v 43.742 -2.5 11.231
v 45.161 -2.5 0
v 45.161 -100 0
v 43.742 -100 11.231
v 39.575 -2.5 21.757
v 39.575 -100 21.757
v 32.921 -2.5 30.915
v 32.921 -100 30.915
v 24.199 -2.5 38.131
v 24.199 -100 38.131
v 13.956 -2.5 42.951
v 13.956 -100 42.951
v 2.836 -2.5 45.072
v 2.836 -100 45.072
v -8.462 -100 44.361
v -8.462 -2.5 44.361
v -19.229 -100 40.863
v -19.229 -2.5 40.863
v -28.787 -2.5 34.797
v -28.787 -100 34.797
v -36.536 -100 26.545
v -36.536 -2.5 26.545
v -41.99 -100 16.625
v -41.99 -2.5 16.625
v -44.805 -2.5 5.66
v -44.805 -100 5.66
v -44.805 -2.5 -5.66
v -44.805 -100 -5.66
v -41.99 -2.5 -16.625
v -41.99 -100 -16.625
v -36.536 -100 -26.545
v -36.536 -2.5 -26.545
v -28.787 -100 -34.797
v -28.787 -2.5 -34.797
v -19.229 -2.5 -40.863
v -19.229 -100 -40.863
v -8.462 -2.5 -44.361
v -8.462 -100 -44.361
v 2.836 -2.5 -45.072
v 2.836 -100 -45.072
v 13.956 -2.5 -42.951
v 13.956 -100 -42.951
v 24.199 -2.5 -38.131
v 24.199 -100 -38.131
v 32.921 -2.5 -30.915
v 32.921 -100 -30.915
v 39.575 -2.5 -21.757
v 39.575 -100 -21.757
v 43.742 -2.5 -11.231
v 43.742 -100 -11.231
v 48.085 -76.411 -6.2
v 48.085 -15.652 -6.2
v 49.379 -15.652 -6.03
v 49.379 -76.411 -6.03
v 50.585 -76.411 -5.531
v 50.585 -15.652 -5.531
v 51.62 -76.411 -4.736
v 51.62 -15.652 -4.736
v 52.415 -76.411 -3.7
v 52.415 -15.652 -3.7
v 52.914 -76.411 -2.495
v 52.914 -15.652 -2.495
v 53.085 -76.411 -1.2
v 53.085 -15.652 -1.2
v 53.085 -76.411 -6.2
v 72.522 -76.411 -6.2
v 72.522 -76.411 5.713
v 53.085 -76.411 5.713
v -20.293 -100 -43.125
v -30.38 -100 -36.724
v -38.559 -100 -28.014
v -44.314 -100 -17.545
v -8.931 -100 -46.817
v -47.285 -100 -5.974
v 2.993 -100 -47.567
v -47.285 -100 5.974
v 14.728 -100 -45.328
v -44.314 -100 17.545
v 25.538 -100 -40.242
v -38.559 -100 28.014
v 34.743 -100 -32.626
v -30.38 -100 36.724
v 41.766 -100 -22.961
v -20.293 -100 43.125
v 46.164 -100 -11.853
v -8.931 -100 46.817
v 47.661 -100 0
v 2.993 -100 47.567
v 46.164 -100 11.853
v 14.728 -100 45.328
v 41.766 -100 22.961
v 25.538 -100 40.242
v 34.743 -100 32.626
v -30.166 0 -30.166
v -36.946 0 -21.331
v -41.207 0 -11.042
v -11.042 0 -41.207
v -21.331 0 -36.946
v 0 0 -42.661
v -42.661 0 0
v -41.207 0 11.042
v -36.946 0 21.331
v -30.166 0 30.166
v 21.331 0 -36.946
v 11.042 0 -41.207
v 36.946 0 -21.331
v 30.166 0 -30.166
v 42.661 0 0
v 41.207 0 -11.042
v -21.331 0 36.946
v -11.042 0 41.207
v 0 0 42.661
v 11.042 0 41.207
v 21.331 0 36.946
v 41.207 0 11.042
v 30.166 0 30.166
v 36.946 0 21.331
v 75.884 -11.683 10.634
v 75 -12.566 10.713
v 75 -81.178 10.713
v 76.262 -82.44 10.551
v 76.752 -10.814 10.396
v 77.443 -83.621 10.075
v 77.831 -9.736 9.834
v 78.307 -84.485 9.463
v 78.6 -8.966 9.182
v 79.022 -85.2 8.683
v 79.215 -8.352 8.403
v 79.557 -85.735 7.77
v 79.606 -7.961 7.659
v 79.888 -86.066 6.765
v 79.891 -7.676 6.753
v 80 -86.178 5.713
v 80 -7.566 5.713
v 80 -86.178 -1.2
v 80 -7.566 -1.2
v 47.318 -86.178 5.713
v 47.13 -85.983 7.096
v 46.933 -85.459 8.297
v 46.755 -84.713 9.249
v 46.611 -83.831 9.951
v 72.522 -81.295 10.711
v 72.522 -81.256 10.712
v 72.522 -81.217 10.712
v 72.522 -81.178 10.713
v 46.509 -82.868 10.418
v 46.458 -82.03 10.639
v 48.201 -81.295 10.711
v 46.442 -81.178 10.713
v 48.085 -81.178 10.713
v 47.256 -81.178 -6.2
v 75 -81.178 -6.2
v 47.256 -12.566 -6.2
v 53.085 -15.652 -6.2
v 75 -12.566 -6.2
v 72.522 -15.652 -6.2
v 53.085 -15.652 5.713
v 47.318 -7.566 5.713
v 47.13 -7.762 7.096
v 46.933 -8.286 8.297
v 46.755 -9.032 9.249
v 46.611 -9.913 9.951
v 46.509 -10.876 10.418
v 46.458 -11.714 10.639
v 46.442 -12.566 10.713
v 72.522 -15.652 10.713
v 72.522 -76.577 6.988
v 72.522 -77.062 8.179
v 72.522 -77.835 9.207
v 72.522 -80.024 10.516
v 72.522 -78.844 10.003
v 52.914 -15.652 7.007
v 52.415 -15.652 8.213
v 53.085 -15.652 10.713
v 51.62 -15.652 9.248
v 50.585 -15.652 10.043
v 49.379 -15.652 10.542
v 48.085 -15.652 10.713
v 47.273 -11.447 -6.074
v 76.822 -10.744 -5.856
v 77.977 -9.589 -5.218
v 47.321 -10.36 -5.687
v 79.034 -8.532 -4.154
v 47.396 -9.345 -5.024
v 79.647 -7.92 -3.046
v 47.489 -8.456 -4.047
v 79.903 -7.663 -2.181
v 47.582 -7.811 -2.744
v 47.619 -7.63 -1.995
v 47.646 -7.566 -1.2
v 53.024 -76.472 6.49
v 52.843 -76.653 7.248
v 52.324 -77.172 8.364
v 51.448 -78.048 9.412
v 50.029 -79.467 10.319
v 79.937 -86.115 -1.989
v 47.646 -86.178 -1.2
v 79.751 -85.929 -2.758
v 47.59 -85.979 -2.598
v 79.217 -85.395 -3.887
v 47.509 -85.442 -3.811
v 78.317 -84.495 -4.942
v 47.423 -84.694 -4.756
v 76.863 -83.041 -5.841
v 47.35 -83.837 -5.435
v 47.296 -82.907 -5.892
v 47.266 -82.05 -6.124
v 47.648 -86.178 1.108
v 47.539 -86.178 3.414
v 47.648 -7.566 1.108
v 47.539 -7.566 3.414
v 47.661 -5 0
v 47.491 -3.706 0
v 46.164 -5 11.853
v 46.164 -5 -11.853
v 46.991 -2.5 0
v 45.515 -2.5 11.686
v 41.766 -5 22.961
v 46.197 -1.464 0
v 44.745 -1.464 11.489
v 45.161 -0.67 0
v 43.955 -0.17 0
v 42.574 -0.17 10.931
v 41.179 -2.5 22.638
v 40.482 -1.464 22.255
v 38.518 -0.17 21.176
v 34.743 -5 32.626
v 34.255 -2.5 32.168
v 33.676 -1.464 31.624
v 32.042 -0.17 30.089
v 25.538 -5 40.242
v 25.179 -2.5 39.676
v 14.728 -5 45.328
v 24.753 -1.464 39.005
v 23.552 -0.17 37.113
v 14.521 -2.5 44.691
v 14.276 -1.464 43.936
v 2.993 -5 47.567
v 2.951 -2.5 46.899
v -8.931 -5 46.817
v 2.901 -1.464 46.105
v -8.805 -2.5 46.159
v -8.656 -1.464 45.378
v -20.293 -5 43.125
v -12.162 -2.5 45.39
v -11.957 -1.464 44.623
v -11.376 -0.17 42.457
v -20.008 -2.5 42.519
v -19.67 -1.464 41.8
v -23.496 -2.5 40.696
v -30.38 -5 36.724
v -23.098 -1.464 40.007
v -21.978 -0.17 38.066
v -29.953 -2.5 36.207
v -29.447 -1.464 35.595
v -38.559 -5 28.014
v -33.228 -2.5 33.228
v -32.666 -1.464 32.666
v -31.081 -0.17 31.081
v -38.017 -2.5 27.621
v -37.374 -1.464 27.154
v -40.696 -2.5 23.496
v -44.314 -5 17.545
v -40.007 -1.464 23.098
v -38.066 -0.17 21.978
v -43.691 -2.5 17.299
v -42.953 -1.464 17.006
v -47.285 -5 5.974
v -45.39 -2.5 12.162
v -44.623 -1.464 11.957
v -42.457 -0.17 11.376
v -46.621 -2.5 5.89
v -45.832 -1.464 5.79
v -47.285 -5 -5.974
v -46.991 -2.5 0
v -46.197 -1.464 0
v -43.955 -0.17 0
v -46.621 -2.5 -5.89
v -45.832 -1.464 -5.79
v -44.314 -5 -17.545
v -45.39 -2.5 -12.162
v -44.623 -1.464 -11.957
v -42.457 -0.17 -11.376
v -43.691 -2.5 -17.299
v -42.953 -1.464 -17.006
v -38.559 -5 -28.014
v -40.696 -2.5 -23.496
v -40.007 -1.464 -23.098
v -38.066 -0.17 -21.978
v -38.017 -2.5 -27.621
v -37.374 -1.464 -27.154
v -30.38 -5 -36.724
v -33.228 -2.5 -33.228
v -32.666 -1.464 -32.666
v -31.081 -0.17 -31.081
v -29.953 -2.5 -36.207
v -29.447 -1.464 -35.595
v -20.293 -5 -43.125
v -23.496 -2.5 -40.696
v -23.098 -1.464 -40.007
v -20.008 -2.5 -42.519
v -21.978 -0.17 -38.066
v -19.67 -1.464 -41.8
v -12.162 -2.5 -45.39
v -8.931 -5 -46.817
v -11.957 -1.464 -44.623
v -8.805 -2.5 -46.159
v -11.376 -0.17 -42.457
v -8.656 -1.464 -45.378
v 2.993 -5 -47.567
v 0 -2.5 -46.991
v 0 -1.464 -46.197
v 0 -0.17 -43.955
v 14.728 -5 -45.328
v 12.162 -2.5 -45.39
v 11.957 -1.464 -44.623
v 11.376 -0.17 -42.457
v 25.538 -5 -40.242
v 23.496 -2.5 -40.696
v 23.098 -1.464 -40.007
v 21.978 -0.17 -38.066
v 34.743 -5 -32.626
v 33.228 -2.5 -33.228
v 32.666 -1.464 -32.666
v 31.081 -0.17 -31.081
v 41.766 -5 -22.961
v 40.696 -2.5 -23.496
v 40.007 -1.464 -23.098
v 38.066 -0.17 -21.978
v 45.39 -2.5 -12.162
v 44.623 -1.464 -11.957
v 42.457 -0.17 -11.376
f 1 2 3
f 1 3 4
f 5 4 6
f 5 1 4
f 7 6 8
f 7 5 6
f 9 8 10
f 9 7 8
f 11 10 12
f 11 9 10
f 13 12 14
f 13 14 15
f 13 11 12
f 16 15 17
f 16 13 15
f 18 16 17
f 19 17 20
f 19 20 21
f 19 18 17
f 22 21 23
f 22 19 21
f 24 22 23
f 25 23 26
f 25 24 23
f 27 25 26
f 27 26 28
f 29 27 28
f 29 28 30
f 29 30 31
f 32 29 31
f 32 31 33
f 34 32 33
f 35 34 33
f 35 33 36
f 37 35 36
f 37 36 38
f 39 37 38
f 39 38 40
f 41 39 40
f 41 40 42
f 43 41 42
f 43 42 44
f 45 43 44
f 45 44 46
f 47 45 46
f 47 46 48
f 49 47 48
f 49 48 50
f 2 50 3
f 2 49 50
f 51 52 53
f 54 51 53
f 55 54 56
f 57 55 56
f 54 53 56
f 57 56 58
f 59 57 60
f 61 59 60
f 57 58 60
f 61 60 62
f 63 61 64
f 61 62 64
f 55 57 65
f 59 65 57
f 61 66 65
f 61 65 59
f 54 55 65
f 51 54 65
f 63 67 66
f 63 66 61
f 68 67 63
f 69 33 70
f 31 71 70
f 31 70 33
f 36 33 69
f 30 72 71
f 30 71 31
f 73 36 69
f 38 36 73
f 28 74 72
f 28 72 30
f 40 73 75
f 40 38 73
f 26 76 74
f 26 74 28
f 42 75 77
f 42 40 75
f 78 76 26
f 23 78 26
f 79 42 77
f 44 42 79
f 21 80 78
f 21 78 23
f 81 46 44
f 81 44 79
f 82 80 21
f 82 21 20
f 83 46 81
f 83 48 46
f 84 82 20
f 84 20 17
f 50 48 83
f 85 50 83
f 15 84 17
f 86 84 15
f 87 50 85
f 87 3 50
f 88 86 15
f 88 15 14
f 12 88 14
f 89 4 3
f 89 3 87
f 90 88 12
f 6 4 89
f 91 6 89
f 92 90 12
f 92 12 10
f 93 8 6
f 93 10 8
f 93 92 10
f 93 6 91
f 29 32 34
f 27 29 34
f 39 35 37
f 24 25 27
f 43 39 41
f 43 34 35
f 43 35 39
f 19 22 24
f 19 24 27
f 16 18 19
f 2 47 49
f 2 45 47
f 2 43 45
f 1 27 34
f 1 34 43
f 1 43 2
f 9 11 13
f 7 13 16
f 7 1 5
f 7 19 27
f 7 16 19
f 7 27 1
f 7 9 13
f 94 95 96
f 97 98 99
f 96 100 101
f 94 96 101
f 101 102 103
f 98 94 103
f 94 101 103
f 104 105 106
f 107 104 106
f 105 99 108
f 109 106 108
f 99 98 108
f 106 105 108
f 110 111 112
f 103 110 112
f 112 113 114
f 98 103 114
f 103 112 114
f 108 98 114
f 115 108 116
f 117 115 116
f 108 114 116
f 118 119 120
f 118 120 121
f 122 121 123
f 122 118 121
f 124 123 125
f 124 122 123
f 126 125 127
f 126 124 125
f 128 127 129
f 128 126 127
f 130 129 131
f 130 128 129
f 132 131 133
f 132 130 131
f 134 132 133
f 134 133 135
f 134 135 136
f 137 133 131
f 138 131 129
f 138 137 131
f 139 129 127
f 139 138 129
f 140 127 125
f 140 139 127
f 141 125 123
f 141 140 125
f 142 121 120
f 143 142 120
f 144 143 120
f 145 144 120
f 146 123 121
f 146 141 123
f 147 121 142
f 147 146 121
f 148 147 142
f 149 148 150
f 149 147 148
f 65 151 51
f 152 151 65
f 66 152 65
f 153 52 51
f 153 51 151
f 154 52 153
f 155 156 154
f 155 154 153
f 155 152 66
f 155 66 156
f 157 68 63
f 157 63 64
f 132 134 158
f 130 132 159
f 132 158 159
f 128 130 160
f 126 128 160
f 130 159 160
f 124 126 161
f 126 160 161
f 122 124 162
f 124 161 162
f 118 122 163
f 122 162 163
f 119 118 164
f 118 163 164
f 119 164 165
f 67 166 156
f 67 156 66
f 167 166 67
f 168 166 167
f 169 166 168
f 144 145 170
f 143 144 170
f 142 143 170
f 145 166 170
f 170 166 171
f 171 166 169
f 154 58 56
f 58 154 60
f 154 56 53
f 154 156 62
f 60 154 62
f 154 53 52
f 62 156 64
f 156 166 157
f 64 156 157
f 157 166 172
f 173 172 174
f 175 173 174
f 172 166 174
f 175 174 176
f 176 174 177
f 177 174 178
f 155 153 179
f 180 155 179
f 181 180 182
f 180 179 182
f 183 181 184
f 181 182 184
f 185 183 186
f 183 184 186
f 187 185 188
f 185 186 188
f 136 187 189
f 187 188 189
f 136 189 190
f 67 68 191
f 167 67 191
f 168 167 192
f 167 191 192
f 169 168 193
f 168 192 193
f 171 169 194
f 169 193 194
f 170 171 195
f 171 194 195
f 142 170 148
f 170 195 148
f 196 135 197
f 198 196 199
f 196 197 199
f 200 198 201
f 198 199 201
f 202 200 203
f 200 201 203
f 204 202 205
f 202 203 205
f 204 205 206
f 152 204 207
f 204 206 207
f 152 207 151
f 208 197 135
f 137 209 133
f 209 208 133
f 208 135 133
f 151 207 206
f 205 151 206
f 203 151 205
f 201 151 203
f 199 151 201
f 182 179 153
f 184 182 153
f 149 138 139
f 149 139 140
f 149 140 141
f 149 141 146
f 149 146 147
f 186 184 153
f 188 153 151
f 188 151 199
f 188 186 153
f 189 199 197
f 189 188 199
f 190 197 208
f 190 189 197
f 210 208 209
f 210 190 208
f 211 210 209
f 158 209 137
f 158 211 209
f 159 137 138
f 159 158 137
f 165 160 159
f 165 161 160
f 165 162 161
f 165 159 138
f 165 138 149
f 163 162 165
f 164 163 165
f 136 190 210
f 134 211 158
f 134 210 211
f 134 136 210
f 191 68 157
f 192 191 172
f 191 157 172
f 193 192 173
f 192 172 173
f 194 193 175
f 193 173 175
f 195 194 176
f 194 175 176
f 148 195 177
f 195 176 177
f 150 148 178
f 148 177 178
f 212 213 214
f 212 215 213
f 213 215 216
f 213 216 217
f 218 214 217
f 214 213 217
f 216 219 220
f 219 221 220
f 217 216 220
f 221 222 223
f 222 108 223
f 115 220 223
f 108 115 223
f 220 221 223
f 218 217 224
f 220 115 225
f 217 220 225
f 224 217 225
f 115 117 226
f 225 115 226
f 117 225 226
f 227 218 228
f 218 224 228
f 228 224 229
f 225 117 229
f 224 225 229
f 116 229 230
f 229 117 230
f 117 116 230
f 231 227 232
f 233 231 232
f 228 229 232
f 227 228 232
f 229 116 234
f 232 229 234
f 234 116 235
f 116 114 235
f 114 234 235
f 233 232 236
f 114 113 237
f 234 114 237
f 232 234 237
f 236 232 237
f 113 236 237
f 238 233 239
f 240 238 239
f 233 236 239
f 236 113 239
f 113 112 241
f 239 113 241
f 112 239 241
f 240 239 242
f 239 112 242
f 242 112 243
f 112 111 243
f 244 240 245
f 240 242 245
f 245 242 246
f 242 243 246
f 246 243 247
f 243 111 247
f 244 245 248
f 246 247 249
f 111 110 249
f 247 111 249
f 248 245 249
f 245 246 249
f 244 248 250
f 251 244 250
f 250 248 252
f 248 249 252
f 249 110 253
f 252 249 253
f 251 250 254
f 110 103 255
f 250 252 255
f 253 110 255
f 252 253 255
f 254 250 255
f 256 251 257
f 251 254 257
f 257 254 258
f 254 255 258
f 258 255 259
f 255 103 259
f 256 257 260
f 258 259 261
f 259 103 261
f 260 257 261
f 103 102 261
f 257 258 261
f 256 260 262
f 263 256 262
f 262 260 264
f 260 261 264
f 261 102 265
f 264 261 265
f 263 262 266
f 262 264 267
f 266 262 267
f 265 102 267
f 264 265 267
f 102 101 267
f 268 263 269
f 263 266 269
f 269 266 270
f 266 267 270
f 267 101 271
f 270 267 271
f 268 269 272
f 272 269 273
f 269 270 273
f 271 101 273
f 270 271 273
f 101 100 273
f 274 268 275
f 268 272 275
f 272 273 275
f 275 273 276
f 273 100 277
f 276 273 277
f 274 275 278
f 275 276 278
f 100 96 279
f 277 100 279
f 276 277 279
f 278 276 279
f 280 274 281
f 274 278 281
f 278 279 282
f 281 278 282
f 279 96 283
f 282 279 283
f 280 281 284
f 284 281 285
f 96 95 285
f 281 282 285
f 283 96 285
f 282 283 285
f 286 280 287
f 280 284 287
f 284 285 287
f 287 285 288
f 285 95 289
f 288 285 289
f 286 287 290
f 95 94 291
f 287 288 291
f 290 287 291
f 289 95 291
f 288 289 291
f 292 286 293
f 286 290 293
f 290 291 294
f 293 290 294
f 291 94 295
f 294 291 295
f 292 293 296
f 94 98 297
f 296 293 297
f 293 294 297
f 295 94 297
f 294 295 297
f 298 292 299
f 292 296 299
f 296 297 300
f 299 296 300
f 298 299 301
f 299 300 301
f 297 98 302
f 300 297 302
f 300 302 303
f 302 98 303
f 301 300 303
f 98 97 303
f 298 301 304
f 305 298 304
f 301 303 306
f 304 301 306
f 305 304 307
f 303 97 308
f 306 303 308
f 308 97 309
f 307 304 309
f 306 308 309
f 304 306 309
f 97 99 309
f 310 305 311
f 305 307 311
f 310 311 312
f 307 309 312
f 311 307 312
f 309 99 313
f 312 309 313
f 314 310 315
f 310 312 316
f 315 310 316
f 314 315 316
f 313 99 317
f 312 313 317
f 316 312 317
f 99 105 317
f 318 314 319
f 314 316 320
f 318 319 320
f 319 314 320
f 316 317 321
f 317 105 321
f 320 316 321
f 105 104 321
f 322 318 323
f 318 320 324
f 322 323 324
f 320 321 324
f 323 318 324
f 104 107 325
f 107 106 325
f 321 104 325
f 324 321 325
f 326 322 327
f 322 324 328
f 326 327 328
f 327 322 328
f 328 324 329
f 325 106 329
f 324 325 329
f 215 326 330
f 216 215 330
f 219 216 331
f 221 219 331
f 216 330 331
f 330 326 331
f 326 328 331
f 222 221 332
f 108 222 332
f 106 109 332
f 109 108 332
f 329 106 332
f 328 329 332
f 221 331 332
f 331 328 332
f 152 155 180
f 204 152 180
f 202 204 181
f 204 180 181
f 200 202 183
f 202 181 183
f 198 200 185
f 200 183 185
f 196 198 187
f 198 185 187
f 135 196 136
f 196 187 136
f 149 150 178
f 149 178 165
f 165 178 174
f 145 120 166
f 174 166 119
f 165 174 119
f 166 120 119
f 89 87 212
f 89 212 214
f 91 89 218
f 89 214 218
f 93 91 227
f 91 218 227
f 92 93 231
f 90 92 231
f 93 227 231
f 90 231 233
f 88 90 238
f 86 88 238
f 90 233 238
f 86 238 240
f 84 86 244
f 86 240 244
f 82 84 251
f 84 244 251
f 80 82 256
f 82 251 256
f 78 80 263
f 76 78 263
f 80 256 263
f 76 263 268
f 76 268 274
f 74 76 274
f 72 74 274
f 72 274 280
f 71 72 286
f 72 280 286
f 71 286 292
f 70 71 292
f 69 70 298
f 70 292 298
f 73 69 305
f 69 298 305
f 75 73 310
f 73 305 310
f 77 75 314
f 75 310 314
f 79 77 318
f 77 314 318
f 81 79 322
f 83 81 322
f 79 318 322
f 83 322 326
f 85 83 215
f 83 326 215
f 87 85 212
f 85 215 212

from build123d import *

# Parameters (mm, degrees)
F0_R         = 47.6611087375
F1_DEPTH     = 100
F2_T         = -2.5
F4_W         = 78.6115438677
F4_H         = 16.9129944406
F6_W         = 19.4371528924
F6_H         = 60.759909451
F7_DEPTH     = 25
F8_T1_DEPTH  = 57.743928854
F8_T3_DEPTH  = 58.5584052808
F8_T5_DEPTH  = 103.6115438677
F8_T7_DEPTH  = 60.759909451
F8_T9_DEPTH  = 19.4371528924
F8_T15_DEPTH = 73.259909451
F8_T20_DEPTH = 31.9371528924
F8_S22_R     = 47.6611087375
F8_T23_DEPTH = 18
F9_R         = 5


# Not quite as in the source:
# - a fillet or chamfer that OpenCascade refuses, or shapes differently, is made with other operations: its cross-section is extruded or revolved along the edge and cut away or added


with BuildPart() as f1:
    # F0 (on Front) → F1 (new body)
    with BuildSketch(Plane.XZ):
        Circle(F0_R)
    extrude(amount=F1_DEPTH)

    # F2
    f2_openings = [f1.faces().sort_by_distance(p)[0] for p in [
        (0, -100, 0),
    ]]
    offset(amount=F2_T, openings=f2_openings)


with BuildPart() as f5:
    # F4 (on offset) → F5 (new body, up to the next surface of F1)
    with BuildSketch(Plane.YZ.offset(80)):
        with Locations((-46.8722551595, 2.2560919169)):
            Rectangle(F4_W, F4_H)
    extrude(until=Until.NEXT, target=f1.part, dir=(-1, 0, 0))

    # F6 (on face) → F7 (cut)
    with BuildSketch(Plane.XY.offset(10.7125891373)):
        with Locations((62.8032963723, -46.0315085948)):
            Rectangle(F6_W, F6_H)
    extrude(amount=-F7_DEPTH, mode=Mode.SUBTRACT)

    # F8: fillet of radius 5 on 9 edges, made by hand

    # F8_s2 → F8_t1 (cut)
    with BuildSketch(Plane.YZ.offset(34.756071146)):
        with BuildLine():
            ThreePointArc((-86.1780270934, -1.2004053034), (-84.7135609993, -4.7359392093), (-81.1780270934, -6.2004053034))
            Line((-81.1780270934, -6.2004053034), (-86.1780270934, -6.2004053034))
            Line((-86.1780270934, -6.2004053034), (-86.1780270934, -1.2004053034))
        make_face()
        with BuildLine():
            ThreePointArc((-12.5664832257, -6.2004053034), (-9.0309493197, -4.7359392093), (-7.5664832257, -1.2004053034))
            Line((-7.5664832257, -1.2004053034), (-7.5664832257, -6.2004053034))
            Line((-7.5664832257, -6.2004053034), (-12.5664832257, -6.2004053034))
        make_face()
    extrude(amount=F8_T1_DEPTH, mode=Mode.SUBTRACT)

    # F8_s4 → F8_t3 (cut)
    with BuildSketch(Plane.YZ.offset(33.9415947192)):
        with BuildLine():
            ThreePointArc((-86.1780270934, 5.7125891373), (-84.7135609993, 9.2481230432), (-81.1780270934, 10.7125891373))
            Line((-81.1780270934, 10.7125891373), (-86.1780270934, 10.7125891373))
            Line((-86.1780270934, 10.7125891373), (-86.1780270934, 5.7125891373))
        make_face()
        with BuildLine():
            ThreePointArc((-7.5664832257, 5.7125891373), (-9.0309493197, 9.2481230432), (-12.5664832257, 10.7125891373))
            Line((-12.5664832257, 10.7125891373), (-7.5664832257, 10.7125891373))
            Line((-7.5664832257, 10.7125891373), (-7.5664832257, 5.7125891373))
        make_face()
    extrude(amount=F8_T3_DEPTH, mode=Mode.SUBTRACT)

    # F8_s6 → F8_t5 (cut)
    with BuildSketch(Plane.XZ.offset(-4.9335167743)):
        with BuildLine():
            ThreePointArc((75, 10.7125891373), (78.5355339059, 9.2481230432), (80, 5.7125891373))
            Line((80, 5.7125891373), (80, 10.7125891373))
            Line((80, 10.7125891373), (75, 10.7125891373))
        make_face()
        with BuildLine():
            ThreePointArc((75, -6.2004053034), (78.5355339059, -4.7359392093), (80, -1.2004053034))
            Line((80, -1.2004053034), (80, -6.2004053034))
            Line((80, -6.2004053034), (75, -6.2004053034))
        make_face()
    extrude(amount=F8_T5_DEPTH, mode=Mode.SUBTRACT)

    # F8_s8 → F8_t7 (cut)
    with BuildSketch(Plane.XZ.offset(15.6515538692)):
        with BuildLine():
            ThreePointArc((53.0847199261, 5.7125891373), (51.6202538321, 9.2481230432), (48.0847199261, 10.7125891373))
            Line((48.0847199261, 10.7125891373), (53.0847199261, 10.7125891373))
            Line((53.0847199261, 10.7125891373), (53.0847199261, 5.7125891373))
        make_face()
        with BuildLine():
            ThreePointArc((48.0847199261, -6.2004053034), (51.6202538321, -4.7359392093), (53.0847199261, -1.2004053034))
            Line((53.0847199261, -1.2004053034), (53.0847199261, -6.2004053034))
            Line((53.0847199261, -6.2004053034), (48.0847199261, -6.2004053034))
        make_face()
    extrude(amount=F8_T7_DEPTH, mode=Mode.SUBTRACT)

    # F8_s10 → F8_t9 (cut)
    with BuildSketch(Plane.YZ.offset(53.0847199261)):
        with BuildLine():
            ThreePointArc((-76.4114633203, 5.7125891373), (-77.8759294143, 9.2481230432), (-81.4114633203, 10.7125891373))
            Line((-81.4114633203, 10.7125891373), (-76.4114633203, 10.7125891373))
            Line((-76.4114633203, 10.7125891373), (-76.4114633203, 5.7125891373))
        make_face()
    extrude(amount=F8_T9_DEPTH, mode=Mode.SUBTRACT)


with BuildPart() as f8_tool13:
    # F8_s14 → F8_t15 (new body)
    with BuildSketch(Plane.XZ.offset(15.6515538692)):
        with BuildLine():
            ThreePointArc((53.0847199261, 5.7125891373), (51.6202538321, 9.2481230432), (48.0847199261, 10.7125891373))
            Line((48.0847199261, 10.7125891373), (53.0847199261, 10.7125891373))
            Line((53.0847199261, 10.7125891373), (53.0847199261, 5.7125891373))
        make_face()
    extrude(amount=F8_T15_DEPTH)

    split(bisect_by=Plane.XZ.offset(86.1780270934), keep=Keep.BOTTOM)

    split(bisect_by=Plane.XZ.offset(76.4114633203), keep=Keep.TOP)


with BuildPart() as f8_tool18:
    # F8_s19 → F8_t20 (new body)
    with BuildSketch(Plane.YZ.offset(40.5847199261)):
        with BuildLine():
            ThreePointArc((-76.4114633203, 5.7125891373), (-77.8759294143, 9.2481230432), (-81.4114633203, 10.7125891373))
            Line((-81.4114633203, 10.7125891373), (-76.4114633203, 10.7125891373))
            Line((-76.4114633203, 10.7125891373), (-76.4114633203, 5.7125891373))
        make_face()
    extrude(amount=F8_T20_DEPTH)

    split(bisect_by=Plane.YZ.offset(53.0847199261), keep=Keep.BOTTOM)

    # F8_s22 → F8_t23 (cut, symmetric)
    with BuildSketch(Plane.XZ.offset(78.9)):
        Circle(F8_S22_R)
    extrude(amount=F8_T23_DEPTH, both=True, mode=Mode.SUBTRACT)


with BuildPart() as f8_tool13_1:
    add(f8_tool13.part)

    # F8_t24: intersect F8_tool18
    add(f8_tool18.part, mode=Mode.INTERSECT)


with BuildPart() as f5_1:
    add(f5.part)

    # F8_t11: cut F8_tool13
    add(f8_tool13_1.part, mode=Mode.SUBTRACT)


with BuildPart() as f1_1:
    add(f1.part)

    # F9
    f9_edges = [f1_1.edges().sort_by_distance(p)[0] for p in [
        (-47.661109, 0, 0),
    ]]
    fillet(f9_edges, radius=F9_R)


solid = Compound([f5_1.part, f1_1.part])
